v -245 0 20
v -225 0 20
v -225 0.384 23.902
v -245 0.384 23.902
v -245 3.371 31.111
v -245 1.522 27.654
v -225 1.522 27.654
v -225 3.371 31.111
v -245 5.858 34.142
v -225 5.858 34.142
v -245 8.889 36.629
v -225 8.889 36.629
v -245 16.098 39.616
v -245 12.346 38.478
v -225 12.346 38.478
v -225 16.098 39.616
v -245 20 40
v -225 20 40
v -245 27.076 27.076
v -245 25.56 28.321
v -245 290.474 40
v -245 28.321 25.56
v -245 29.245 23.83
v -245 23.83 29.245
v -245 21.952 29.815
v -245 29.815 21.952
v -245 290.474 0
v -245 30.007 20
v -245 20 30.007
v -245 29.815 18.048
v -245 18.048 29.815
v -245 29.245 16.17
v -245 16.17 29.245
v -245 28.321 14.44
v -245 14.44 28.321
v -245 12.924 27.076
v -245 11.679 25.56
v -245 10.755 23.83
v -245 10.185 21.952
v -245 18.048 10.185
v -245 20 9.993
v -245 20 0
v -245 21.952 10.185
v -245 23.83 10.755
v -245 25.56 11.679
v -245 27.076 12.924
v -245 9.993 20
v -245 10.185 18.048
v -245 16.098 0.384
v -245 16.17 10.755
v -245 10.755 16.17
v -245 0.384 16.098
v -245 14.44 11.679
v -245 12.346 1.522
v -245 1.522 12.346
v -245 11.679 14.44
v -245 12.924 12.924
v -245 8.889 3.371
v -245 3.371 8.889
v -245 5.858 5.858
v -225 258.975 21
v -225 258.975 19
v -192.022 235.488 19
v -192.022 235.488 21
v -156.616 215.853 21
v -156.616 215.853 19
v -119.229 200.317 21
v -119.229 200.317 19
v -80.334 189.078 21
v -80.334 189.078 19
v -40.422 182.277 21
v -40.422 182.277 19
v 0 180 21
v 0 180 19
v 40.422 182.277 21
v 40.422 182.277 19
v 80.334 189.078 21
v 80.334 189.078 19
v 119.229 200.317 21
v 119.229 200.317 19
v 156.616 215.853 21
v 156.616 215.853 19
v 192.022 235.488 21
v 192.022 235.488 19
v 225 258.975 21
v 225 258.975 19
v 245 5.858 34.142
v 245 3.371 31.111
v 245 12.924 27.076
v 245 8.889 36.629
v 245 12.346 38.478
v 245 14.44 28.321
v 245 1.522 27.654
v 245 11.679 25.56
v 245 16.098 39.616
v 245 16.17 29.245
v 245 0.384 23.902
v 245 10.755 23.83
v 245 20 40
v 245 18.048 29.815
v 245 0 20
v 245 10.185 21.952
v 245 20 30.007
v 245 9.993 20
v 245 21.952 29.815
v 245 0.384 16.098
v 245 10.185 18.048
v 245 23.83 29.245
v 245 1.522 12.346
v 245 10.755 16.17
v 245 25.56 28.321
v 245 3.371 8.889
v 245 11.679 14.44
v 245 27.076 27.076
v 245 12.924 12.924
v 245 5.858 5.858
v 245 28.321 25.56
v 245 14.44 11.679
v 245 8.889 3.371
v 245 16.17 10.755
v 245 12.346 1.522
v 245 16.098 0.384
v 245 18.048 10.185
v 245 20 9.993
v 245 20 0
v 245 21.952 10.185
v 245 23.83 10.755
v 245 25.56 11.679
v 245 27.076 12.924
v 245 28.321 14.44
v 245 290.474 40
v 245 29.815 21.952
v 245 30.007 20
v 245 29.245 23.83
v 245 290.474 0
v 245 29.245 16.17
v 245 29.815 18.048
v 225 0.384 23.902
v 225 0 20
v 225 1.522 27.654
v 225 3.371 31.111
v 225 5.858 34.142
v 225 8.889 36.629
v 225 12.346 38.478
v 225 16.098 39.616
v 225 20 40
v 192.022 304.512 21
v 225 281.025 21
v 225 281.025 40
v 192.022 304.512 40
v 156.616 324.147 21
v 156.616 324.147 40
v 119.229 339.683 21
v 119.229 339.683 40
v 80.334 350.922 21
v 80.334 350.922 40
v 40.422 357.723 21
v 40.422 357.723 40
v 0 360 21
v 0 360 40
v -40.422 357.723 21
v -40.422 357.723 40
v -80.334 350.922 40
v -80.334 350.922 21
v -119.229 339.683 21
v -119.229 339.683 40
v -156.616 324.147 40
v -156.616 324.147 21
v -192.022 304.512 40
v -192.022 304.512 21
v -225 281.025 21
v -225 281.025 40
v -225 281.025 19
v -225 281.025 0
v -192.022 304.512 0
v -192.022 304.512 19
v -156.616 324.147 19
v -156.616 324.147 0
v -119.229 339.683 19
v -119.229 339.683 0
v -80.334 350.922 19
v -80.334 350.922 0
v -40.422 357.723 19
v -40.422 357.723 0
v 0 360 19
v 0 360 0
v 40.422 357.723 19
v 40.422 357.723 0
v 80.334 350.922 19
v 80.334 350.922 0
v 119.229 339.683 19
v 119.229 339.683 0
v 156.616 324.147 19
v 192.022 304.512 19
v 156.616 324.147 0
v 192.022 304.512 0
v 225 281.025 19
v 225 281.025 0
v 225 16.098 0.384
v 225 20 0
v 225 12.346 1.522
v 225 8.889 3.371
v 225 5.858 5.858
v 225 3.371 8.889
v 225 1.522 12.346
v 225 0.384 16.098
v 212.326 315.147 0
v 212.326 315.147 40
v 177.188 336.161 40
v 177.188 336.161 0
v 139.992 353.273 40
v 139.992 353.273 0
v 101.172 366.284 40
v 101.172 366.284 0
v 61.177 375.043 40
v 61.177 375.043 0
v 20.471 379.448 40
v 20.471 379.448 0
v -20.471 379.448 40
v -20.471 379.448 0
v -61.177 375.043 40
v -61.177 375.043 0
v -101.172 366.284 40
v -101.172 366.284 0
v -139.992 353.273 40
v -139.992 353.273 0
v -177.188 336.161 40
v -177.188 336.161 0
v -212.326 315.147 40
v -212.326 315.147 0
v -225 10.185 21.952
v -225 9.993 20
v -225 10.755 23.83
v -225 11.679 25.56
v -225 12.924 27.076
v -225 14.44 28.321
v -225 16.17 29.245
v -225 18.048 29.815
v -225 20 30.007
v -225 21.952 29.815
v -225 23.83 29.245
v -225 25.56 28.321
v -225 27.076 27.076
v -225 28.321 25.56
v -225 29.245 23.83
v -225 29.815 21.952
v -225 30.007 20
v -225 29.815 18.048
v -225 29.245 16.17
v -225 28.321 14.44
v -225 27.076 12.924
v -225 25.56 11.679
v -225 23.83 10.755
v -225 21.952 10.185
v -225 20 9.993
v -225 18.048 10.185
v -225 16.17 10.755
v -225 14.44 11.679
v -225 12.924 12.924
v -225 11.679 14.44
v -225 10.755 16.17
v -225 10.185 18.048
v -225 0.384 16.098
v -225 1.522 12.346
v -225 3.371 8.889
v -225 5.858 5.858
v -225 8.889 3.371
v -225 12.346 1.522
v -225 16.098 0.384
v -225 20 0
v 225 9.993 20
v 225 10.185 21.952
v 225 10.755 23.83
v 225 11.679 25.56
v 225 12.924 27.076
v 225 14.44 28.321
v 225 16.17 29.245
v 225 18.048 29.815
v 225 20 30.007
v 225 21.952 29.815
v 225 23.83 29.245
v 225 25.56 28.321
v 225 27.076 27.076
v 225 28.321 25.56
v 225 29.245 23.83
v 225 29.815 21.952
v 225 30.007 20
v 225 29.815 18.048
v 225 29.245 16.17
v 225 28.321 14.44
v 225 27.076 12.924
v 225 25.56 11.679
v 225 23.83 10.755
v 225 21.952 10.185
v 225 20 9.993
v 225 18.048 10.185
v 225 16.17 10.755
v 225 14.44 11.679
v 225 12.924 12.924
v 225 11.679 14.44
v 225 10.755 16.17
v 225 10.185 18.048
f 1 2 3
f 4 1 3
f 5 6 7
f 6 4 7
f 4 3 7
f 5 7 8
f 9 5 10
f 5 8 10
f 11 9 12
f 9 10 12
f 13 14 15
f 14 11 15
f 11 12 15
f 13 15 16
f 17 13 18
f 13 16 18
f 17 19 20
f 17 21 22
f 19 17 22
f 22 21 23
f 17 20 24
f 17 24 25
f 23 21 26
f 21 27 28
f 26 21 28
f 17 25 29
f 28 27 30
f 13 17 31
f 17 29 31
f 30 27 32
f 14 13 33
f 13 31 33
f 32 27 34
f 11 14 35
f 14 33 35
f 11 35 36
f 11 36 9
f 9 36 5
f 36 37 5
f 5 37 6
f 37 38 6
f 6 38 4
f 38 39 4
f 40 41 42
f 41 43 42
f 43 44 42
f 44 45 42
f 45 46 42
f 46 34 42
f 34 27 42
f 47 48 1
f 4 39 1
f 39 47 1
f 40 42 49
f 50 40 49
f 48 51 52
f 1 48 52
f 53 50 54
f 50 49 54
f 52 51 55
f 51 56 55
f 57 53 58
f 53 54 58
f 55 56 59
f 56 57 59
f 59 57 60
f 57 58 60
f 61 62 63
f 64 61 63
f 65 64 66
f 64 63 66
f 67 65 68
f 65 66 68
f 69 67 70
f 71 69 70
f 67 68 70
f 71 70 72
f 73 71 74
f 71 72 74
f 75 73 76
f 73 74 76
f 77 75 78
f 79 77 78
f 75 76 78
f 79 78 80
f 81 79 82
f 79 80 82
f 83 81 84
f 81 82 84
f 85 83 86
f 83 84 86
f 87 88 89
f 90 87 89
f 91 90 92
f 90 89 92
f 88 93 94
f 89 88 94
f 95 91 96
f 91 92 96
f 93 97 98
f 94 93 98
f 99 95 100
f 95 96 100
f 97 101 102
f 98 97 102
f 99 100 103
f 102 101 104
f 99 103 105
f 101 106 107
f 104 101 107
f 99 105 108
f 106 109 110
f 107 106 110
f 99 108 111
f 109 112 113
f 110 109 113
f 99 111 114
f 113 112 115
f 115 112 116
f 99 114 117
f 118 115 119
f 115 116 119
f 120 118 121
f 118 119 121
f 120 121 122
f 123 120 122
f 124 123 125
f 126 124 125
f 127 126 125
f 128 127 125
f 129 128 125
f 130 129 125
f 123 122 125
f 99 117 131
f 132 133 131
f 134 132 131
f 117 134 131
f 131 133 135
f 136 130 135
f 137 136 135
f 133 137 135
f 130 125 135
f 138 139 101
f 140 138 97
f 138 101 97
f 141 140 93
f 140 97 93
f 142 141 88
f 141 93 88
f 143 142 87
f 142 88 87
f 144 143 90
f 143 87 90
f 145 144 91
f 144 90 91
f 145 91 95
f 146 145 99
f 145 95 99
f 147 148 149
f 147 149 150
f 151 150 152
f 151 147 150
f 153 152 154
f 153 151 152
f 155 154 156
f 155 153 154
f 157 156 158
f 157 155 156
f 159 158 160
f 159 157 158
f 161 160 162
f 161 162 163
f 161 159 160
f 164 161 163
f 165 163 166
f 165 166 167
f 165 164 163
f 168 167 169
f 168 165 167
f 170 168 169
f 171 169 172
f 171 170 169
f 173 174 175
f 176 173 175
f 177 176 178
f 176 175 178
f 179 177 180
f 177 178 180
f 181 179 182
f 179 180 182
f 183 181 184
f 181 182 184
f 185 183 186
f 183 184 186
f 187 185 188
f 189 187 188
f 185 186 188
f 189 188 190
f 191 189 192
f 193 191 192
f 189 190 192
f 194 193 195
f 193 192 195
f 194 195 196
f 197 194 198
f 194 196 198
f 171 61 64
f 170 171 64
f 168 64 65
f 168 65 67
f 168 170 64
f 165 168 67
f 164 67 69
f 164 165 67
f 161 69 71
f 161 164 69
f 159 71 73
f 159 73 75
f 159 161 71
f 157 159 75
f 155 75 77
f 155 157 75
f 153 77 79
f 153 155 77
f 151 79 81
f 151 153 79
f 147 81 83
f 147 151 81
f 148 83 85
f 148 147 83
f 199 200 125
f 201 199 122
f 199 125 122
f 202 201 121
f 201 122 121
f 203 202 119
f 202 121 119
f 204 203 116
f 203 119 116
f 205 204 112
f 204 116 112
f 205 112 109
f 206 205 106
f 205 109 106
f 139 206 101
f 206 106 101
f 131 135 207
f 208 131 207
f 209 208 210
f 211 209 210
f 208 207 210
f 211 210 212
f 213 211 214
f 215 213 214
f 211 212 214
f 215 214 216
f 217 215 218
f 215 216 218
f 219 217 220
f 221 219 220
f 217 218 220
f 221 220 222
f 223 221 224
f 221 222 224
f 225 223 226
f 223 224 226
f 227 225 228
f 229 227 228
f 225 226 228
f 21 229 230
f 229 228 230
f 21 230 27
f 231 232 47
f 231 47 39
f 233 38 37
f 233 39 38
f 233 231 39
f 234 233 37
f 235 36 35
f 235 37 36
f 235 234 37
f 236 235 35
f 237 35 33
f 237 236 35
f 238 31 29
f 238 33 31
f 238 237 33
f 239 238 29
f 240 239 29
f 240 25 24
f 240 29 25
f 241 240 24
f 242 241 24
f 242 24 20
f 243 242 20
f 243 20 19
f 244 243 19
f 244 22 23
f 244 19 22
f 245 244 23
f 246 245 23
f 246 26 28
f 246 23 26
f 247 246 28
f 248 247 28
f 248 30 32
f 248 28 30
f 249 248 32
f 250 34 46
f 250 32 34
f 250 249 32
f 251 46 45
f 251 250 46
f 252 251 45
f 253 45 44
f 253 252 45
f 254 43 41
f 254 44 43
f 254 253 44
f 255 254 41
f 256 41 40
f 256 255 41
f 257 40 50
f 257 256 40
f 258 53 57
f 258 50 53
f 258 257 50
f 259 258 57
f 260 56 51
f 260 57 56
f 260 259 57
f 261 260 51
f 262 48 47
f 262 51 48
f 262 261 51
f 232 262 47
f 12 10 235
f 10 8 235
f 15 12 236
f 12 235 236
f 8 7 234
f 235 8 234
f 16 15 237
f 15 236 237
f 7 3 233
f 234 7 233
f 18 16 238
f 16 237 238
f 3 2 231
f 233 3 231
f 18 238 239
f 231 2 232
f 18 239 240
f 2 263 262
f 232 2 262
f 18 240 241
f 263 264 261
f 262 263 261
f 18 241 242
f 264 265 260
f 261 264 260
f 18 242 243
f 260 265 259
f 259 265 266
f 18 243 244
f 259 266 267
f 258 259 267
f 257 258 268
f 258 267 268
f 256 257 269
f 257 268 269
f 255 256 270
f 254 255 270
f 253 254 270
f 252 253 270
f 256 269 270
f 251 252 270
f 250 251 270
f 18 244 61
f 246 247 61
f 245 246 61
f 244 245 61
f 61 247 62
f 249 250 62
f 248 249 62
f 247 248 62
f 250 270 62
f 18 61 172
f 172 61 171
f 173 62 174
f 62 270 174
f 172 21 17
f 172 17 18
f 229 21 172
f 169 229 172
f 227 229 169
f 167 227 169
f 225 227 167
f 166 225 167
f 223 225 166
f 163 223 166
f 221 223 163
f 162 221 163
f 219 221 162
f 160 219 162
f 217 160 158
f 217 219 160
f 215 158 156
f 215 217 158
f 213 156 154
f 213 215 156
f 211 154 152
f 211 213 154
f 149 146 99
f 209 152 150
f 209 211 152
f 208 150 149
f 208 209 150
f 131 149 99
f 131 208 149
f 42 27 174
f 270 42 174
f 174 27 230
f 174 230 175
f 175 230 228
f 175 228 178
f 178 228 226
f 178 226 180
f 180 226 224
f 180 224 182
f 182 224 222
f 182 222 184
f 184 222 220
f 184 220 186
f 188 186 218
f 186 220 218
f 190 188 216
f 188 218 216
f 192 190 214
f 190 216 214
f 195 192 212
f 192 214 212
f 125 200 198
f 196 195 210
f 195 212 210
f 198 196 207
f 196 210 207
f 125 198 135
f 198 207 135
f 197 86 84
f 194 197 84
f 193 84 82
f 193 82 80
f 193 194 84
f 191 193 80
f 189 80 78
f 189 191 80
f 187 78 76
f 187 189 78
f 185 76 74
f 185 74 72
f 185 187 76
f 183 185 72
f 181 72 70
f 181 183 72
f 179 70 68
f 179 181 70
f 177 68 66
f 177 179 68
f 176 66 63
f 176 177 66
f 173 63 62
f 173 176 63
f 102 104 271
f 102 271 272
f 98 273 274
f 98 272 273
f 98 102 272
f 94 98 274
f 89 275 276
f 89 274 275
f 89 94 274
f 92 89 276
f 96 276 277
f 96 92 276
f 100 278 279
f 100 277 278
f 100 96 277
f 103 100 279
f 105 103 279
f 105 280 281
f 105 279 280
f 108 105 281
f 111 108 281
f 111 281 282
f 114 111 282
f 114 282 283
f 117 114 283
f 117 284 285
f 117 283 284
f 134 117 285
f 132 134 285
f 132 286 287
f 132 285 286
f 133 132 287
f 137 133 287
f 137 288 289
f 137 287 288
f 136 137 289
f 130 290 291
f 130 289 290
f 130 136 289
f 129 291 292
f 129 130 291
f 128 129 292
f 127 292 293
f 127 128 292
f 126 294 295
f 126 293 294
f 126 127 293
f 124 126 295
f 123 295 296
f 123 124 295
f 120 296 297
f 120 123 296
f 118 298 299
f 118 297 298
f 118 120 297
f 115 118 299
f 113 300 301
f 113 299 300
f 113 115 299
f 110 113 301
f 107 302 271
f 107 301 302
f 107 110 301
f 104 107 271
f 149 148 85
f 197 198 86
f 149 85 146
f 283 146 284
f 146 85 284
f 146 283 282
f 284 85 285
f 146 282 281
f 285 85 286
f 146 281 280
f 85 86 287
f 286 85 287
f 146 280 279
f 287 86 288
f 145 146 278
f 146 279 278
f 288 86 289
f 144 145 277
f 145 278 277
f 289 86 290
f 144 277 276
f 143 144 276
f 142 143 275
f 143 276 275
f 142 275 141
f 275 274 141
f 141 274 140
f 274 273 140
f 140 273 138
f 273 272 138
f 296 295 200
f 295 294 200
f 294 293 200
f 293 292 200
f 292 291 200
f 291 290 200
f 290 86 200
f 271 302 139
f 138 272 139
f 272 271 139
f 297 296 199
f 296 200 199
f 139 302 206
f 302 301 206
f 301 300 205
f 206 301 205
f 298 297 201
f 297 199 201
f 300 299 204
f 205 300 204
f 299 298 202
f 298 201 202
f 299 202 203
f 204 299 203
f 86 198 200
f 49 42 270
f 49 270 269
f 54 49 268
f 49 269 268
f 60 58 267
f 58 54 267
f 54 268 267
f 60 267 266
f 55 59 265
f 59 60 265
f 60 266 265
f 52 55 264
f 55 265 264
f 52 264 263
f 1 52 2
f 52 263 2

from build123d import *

# Parameters (mm, degrees)
EXTRUDE_1_DEPTH          = 40
CUT_EXTRUDE_1_DEPTH      = 19
CUT_EXTRUDE_START        = -19
CUT_EXTRUDE_2_DEPTH      = 19
CUT_EXTRUDE_3_DEPTH      = 622.369455316
CUT_EXTRUDE_4_DEPTH      = 622.369455316
CUT_EXTRUDE_4_DEPTH_BACK = 622.369455316
SKETCH_5_R               = 10.007014795


with BuildPart() as part:
    # 草图1 → 凸台-拉伸1 (new body)
    with BuildSketch(Plane.XY):
        with BuildLine():
            Line((245, 0), (245, 290.473750966))
            ThreePointArc((245, 290.473750966), (0, 380), (-245, 290.473750966))
            Line((-245, 290.473750966), (-245, 0))
            Line((-245, 0), (-225, 0))
            Line((-225, 0), (-225, 258.975090072))
            ThreePointArc((-225, 258.975090072), (0, 180), (225, 258.975090072))
            Line((225, 258.975090072), (225, 0))
            Line((225, 0), (245, 0))
        make_face()
    extrude(amount=EXTRUDE_1_DEPTH)

    # 草图2 → 切除-拉伸1 (cut)
    with BuildSketch(Plane(origin=(0, 0, 0), x_dir=(-1, 0, 0), z_dir=(0, 0, -1))):
        with BuildLine():
            Line((225, 258.975090072), (225, 281.024909928))
            ThreePointArc((225, 281.024909928), (0, 360), (-225, 281.024909928))
            Line((-225, 281.024909928), (-225, 258.975090072))
            ThreePointArc((-225, 258.975090072), (0, 180), (225, 258.975090072))
        make_face()
    extrude(amount=-CUT_EXTRUDE_1_DEPTH, mode=Mode.SUBTRACT)

    # 草图3 → 切除-拉伸2 (cut)
    with BuildSketch(Plane.XY.offset(40).offset(CUT_EXTRUDE_START)):
        with BuildLine():
            Line((225, 258.975090072), (225, 281.024909928))
            ThreePointArc((225, 281.024909928), (0, 360), (-225, 281.024909928))
            Line((-225, 281.024909928), (-225, 258.975090072))
            ThreePointArc((-225, 258.975090072), (0, 180), (225, 258.975090072))
        make_face()
    extrude(amount=CUT_EXTRUDE_2_DEPTH, mode=Mode.SUBTRACT)

    # 草图4 → 切除-拉伸3 (cut, through all)
    with BuildSketch(Plane(origin=(245, 0, 0), x_dir=(0, 0, -1), z_dir=(1, 0, 0))):
        with BuildLine():
            ThreePointArc((-20, 0), (-34.142135624, 5.857864376), (-40, 20))
            Line((-40, 20), (-40, 0))
            Line((-40, 0), (-20, 0))
        make_face()
        with BuildLine():
            ThreePointArc((0, 20), (-5.857864376, 5.857864376), (-20, 0))
            Line((-20, 0), (0, 0))
            Line((0, 0), (0, 20))
        make_face()
    extrude(amount=-CUT_EXTRUDE_3_DEPTH, mode=Mode.SUBTRACT)

    # 草图5 → 切除-拉伸4 (cut, two sides: drawn at the far end of the back side and taken through both)
    with BuildSketch(Plane.ZY.offset(245).offset(-CUT_EXTRUDE_4_DEPTH_BACK)):
        with Locations(Location((20, 20, 0), (0, 0, 270))):
            Circle(SKETCH_5_R)
    extrude(amount=CUT_EXTRUDE_4_DEPTH + CUT_EXTRUDE_4_DEPTH_BACK, mode=Mode.SUBTRACT)


solid = part.part
